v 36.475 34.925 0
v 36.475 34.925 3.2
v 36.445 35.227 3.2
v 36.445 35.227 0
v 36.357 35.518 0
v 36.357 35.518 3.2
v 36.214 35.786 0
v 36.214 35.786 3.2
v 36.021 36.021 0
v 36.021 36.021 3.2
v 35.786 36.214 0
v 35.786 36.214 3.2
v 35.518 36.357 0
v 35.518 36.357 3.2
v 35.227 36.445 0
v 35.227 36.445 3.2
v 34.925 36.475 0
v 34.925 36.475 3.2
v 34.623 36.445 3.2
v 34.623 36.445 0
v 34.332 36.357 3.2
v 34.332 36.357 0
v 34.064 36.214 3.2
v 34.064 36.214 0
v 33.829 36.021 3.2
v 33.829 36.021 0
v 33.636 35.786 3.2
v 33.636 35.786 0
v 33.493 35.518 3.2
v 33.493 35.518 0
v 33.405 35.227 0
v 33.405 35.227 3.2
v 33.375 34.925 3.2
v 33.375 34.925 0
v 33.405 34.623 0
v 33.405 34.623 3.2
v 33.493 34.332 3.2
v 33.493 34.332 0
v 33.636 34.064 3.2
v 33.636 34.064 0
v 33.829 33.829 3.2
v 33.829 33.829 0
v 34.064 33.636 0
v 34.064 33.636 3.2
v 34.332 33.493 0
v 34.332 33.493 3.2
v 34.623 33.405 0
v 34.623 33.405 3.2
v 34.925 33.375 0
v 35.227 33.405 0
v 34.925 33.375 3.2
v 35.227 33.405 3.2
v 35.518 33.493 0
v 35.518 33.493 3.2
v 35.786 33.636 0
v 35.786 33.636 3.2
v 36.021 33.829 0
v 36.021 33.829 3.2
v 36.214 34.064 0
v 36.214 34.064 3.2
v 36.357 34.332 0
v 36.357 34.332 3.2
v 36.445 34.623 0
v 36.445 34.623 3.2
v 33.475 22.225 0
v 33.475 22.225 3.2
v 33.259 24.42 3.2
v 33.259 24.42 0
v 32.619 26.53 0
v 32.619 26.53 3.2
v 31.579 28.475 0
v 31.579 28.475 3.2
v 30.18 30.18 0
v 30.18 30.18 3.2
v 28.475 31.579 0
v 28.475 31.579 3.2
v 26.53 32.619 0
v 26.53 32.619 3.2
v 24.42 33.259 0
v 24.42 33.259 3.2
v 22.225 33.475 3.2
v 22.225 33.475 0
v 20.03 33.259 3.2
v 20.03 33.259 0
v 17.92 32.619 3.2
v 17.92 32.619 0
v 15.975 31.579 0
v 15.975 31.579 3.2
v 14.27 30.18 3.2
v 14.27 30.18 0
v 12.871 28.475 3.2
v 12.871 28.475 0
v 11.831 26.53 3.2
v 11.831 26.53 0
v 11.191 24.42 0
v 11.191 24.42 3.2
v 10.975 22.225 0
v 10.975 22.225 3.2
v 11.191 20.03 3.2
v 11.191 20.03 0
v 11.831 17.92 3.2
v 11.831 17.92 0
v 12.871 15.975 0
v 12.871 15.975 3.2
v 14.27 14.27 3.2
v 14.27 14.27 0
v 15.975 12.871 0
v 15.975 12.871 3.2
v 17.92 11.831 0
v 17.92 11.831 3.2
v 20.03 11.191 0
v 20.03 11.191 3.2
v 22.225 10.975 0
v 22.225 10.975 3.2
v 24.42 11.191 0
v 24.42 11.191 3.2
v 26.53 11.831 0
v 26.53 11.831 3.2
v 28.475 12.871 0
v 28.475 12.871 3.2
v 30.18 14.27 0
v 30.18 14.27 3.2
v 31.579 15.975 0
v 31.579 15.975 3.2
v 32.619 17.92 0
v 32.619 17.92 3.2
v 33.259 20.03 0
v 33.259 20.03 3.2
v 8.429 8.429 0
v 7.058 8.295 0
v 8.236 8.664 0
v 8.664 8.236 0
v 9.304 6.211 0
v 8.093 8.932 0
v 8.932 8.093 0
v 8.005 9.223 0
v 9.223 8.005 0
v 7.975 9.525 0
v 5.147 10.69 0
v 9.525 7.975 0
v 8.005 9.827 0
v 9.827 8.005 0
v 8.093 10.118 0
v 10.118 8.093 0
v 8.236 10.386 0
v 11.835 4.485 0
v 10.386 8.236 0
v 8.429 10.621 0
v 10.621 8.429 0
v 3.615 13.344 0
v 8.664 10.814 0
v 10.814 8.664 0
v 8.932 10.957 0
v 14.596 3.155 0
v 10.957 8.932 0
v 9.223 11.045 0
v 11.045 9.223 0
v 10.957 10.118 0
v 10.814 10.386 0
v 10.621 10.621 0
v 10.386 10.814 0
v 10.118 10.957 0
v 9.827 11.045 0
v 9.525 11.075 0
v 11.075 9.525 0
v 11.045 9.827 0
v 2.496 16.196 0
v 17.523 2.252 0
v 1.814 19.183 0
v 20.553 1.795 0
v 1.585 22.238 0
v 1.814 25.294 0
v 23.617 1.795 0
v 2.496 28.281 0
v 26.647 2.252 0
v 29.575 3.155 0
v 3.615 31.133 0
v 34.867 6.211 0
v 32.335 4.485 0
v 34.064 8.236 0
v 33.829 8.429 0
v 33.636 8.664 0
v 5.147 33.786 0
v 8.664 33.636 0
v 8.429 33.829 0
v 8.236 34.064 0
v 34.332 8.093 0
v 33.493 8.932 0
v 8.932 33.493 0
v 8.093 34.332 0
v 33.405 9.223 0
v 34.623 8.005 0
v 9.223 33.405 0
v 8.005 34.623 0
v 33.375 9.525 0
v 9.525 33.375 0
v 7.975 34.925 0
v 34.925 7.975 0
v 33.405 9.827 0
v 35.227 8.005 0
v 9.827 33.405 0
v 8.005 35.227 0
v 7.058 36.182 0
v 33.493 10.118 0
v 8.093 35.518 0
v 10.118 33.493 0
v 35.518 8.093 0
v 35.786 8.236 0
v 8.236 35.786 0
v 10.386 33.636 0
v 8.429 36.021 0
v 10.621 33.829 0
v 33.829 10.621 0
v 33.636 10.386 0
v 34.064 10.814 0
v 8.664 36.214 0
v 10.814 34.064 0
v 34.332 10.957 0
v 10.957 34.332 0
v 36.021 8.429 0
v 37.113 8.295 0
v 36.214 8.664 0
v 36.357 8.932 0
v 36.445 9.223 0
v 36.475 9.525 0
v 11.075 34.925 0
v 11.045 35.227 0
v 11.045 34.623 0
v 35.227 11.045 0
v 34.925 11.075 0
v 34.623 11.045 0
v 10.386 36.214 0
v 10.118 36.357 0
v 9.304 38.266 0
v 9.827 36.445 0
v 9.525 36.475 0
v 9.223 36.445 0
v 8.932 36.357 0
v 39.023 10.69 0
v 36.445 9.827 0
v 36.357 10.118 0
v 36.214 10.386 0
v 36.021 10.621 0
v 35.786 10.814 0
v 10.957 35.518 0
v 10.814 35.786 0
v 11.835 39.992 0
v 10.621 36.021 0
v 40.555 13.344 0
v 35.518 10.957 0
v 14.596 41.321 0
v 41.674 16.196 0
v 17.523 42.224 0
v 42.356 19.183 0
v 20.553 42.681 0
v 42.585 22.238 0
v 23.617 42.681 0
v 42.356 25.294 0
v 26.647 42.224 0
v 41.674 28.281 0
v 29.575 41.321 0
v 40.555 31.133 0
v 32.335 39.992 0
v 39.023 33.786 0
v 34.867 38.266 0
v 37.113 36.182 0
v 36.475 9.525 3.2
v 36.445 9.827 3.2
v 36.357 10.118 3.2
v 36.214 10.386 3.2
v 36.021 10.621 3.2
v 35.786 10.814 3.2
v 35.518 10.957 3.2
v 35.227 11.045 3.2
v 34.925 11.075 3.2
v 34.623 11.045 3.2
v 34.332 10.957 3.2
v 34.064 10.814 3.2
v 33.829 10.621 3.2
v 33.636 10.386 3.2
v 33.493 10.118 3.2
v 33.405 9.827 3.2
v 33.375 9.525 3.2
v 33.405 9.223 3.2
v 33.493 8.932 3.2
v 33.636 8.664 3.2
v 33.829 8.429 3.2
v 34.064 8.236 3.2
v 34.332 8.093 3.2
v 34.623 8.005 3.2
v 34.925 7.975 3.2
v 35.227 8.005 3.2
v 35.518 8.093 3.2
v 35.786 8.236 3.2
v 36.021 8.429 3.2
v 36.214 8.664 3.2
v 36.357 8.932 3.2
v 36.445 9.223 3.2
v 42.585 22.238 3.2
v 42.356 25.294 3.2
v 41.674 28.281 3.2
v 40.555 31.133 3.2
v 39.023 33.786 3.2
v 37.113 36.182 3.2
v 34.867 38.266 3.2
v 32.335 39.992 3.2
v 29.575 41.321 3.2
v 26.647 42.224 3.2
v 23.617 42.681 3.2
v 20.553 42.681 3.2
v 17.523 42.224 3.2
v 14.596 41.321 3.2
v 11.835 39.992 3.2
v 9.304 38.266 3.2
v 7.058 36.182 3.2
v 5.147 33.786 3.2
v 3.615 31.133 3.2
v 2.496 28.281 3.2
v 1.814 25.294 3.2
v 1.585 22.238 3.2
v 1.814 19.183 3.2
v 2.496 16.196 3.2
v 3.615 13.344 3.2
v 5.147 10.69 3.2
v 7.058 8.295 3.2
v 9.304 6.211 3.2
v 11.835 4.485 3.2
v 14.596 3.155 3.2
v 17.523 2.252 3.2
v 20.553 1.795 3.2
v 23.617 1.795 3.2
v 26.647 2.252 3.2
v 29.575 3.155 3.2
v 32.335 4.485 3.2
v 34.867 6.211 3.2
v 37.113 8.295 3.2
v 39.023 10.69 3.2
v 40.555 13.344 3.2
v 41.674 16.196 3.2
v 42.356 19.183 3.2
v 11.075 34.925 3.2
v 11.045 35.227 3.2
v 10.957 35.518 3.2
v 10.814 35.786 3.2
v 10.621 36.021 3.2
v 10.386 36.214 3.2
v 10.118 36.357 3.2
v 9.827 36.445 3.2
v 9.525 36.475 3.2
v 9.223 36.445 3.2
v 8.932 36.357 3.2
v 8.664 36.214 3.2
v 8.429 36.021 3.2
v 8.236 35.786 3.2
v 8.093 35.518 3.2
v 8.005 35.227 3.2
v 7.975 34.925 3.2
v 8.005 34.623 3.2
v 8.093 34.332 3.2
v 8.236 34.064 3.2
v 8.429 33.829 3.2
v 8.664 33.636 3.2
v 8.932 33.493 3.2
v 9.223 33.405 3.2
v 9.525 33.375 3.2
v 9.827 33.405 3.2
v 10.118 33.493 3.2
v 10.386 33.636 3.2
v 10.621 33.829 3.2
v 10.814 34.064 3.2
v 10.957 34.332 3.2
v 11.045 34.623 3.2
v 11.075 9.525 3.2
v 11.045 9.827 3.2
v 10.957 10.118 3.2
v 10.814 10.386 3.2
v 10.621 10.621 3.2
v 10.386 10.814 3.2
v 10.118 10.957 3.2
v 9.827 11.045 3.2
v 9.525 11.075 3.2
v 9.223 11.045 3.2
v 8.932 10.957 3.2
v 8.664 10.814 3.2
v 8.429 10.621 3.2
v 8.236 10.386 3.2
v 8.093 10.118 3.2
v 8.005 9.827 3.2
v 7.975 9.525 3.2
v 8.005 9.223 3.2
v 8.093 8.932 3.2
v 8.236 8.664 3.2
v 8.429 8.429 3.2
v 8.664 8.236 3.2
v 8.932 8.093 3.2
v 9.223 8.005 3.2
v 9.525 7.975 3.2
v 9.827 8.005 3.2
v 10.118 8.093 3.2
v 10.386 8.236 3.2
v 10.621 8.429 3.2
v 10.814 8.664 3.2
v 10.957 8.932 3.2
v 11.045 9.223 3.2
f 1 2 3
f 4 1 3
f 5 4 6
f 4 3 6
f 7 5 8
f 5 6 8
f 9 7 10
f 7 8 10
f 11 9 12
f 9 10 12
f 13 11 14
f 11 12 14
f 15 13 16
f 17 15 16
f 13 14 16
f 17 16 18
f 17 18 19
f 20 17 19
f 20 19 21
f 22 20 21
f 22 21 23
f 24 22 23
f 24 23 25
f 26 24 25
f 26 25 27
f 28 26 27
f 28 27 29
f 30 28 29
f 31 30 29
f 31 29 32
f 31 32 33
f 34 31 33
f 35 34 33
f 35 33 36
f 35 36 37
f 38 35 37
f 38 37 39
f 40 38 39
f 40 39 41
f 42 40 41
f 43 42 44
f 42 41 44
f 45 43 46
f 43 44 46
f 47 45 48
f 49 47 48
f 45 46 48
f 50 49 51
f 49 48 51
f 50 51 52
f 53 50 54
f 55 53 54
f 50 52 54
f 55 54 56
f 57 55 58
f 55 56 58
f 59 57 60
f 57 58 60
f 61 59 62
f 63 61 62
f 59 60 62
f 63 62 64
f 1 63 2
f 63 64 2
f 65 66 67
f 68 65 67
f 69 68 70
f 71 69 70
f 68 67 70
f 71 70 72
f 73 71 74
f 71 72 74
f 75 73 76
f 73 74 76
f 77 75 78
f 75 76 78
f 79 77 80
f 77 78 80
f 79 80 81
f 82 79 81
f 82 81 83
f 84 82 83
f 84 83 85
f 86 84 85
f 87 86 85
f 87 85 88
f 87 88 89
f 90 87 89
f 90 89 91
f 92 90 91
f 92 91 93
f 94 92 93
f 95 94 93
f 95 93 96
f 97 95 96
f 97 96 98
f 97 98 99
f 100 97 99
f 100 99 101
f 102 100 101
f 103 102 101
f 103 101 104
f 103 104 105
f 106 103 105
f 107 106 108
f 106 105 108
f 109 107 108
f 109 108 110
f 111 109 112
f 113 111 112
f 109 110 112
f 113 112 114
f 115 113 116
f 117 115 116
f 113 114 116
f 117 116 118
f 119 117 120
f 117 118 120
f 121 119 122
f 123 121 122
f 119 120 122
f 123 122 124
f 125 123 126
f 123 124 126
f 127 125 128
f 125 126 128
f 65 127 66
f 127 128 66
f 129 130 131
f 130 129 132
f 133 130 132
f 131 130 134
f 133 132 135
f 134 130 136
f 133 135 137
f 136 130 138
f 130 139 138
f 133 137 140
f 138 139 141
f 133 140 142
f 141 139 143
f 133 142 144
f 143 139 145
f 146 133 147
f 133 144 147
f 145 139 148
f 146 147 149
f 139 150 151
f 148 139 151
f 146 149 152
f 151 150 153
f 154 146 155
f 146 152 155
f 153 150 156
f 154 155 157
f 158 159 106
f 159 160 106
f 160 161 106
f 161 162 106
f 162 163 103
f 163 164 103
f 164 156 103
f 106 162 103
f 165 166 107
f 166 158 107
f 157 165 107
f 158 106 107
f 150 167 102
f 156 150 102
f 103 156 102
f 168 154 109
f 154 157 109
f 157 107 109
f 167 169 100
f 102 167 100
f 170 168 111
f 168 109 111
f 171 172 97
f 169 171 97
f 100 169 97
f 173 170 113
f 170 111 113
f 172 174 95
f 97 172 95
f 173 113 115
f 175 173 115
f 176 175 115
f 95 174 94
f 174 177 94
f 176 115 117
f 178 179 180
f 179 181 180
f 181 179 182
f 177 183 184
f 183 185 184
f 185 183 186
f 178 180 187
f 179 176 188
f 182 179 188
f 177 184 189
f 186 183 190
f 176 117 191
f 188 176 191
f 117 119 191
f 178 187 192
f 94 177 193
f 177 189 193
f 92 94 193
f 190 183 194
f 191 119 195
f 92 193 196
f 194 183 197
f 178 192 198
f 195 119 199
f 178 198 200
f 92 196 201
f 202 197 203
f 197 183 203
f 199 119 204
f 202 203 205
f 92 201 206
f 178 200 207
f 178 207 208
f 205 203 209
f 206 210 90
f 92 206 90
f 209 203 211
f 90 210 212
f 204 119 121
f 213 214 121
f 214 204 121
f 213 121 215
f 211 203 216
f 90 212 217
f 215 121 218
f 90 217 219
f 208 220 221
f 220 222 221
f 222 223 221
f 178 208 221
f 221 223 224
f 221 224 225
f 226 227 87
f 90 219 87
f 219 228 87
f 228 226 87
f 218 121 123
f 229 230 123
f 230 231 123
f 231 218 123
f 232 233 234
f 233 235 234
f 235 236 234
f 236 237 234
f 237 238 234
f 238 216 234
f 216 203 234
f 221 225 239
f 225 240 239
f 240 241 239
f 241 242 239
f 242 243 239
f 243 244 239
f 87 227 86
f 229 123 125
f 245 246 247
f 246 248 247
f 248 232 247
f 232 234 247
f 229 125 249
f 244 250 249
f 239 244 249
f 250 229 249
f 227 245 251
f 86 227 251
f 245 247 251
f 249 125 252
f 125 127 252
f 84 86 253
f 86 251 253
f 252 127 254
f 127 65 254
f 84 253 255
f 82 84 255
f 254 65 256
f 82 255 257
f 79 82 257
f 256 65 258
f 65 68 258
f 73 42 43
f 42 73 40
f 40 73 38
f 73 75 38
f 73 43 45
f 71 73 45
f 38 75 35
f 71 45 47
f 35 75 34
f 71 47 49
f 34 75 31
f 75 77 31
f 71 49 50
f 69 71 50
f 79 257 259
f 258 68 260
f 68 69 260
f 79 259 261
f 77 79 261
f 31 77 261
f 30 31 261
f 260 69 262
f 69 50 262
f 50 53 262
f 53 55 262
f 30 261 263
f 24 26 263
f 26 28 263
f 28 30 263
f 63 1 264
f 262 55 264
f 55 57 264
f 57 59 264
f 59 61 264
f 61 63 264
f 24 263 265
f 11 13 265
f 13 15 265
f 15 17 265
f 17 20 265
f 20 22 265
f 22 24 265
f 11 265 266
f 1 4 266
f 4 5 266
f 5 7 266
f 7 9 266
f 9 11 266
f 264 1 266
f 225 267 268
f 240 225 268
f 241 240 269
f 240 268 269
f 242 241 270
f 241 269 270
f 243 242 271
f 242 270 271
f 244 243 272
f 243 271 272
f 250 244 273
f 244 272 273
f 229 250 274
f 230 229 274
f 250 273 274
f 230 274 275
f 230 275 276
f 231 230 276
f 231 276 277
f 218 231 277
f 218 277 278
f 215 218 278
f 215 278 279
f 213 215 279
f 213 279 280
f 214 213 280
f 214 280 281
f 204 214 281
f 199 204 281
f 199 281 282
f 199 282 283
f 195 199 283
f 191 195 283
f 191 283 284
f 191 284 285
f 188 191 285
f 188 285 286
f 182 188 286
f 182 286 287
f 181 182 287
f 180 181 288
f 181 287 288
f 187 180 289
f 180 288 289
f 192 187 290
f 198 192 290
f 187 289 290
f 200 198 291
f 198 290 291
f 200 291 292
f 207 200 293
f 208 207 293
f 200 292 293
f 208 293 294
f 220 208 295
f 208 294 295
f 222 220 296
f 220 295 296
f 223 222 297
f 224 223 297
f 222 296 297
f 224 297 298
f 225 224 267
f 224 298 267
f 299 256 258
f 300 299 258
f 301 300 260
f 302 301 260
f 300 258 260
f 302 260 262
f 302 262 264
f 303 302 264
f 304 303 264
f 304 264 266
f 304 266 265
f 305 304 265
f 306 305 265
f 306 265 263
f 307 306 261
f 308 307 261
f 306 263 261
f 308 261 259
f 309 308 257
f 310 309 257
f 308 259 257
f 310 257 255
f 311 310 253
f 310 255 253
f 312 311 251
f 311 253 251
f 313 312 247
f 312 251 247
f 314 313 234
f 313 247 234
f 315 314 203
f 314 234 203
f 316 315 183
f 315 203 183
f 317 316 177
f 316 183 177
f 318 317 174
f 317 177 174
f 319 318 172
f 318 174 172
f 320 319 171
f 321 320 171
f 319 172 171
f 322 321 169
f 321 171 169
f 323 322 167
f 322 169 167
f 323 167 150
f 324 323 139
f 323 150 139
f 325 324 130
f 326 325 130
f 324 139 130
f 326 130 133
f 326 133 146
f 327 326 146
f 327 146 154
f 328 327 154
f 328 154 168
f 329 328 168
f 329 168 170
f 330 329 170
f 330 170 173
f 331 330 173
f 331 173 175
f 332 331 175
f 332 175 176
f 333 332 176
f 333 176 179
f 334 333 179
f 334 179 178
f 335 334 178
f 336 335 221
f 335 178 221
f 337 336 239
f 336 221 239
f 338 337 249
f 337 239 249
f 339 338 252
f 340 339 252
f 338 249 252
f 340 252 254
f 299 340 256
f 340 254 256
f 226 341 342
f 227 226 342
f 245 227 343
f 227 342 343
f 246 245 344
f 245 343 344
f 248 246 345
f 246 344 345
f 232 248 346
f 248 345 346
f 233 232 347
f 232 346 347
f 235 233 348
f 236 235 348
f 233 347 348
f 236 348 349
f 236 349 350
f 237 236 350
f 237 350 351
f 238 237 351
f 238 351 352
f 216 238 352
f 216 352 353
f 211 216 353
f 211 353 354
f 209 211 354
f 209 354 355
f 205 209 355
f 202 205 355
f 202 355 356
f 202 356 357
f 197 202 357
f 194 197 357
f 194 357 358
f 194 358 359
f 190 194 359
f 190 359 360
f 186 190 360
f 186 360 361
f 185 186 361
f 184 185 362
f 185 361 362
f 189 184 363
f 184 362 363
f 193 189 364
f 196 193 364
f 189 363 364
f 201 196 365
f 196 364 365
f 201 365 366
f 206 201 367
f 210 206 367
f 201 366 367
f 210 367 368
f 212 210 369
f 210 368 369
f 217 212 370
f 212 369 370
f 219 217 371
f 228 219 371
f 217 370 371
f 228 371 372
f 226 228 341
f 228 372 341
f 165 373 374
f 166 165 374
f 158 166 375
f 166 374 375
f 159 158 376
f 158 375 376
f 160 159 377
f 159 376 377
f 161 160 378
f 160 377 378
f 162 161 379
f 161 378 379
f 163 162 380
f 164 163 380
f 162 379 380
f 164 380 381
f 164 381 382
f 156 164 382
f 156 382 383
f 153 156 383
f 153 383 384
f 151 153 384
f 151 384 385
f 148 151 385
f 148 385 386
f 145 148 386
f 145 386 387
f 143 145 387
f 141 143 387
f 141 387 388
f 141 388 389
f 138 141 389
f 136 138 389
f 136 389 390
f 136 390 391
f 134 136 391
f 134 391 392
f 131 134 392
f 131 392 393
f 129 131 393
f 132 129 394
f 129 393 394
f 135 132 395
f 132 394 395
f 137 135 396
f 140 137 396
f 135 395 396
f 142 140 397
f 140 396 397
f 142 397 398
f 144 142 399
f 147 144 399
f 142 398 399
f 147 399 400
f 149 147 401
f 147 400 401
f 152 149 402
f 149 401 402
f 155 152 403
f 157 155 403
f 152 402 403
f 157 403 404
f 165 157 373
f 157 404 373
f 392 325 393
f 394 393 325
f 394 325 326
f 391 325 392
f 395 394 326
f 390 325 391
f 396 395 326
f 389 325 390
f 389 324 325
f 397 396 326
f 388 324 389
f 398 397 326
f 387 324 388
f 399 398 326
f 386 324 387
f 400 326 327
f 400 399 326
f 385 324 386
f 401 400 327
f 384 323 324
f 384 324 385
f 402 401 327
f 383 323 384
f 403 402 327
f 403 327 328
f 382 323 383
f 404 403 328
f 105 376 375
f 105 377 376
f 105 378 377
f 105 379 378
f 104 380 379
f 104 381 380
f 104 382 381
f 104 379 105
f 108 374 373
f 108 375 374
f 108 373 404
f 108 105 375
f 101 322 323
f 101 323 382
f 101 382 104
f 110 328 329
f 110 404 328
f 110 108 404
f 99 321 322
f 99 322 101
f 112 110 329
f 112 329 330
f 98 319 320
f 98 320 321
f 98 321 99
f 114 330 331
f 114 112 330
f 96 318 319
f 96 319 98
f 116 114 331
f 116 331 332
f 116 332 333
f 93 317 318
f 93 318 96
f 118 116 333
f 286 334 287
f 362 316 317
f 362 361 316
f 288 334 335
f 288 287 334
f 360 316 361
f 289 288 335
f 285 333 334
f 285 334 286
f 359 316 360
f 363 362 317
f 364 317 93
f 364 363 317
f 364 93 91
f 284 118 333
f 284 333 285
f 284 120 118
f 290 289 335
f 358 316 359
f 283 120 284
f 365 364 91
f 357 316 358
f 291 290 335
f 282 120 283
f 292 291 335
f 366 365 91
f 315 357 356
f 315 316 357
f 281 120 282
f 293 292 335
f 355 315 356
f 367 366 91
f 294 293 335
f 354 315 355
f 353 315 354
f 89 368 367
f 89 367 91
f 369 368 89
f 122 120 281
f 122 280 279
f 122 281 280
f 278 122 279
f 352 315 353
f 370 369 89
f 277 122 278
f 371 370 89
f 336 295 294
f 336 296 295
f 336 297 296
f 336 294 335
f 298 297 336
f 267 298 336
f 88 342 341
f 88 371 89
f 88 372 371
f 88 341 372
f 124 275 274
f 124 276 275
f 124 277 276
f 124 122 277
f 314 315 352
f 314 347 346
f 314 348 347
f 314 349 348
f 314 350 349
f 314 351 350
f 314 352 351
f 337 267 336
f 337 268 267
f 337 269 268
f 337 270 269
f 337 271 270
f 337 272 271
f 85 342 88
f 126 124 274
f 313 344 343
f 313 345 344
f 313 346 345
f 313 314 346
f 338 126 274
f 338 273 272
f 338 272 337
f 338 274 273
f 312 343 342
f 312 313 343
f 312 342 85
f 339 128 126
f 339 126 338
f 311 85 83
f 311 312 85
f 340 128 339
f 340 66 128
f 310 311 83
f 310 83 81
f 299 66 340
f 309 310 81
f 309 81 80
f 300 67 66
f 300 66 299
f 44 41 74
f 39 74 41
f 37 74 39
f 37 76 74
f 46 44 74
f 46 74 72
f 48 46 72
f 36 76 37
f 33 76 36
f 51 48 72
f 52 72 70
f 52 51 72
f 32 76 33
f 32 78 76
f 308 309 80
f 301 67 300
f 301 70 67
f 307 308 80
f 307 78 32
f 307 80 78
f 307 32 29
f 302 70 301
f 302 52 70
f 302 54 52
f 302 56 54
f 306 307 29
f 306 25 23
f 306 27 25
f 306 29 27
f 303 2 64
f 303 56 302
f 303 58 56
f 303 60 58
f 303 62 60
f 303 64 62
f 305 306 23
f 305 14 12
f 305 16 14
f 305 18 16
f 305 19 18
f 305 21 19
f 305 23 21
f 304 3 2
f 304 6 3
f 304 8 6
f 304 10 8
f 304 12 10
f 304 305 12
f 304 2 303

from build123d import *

# Parameters (mm, degrees)
SKETCH1_R          = 20.5
EXTRUDE1_DEPTH     = 3.2
SKETCH2_R          = 11.25
CUT_EXTRUDE1_DEPTH = 61.417603842
SKETCH3_R          = 1.55
CUT_EXTRUDE2_DEPTH = 61.417603842


with BuildPart() as part:
    # Sketch1 → Extrude1 (new body)
    with BuildSketch(Plane.XY):
        with Locations((22.085163637, 22.23816435)):
            Circle(SKETCH1_R)
    extrude(amount=EXTRUDE1_DEPTH)

    # Sketch2 → Cut-Extrude1 (cut, through all)
    with BuildSketch(Plane.XY.offset(3.2)):
        with Locations((22.225, 22.225)):
            Circle(SKETCH2_R)
    extrude(amount=-CUT_EXTRUDE1_DEPTH, mode=Mode.SUBTRACT)

    # Sketch3 → Cut-Extrude2 (cut, through all)
    with BuildSketch(Plane.XY.offset(3.2)):
        with Locations((34.925, 34.925)):
            Circle(SKETCH3_R)
        with Locations((9.525, 34.925)):
            Circle(SKETCH3_R)
        with Locations((34.925, 9.525)):
            Circle(SKETCH3_R)
        with Locations((9.525, 9.525)):
            Circle(SKETCH3_R)
    extrude(amount=-CUT_EXTRUDE2_DEPTH, mode=Mode.SUBTRACT)


solid = part.part
